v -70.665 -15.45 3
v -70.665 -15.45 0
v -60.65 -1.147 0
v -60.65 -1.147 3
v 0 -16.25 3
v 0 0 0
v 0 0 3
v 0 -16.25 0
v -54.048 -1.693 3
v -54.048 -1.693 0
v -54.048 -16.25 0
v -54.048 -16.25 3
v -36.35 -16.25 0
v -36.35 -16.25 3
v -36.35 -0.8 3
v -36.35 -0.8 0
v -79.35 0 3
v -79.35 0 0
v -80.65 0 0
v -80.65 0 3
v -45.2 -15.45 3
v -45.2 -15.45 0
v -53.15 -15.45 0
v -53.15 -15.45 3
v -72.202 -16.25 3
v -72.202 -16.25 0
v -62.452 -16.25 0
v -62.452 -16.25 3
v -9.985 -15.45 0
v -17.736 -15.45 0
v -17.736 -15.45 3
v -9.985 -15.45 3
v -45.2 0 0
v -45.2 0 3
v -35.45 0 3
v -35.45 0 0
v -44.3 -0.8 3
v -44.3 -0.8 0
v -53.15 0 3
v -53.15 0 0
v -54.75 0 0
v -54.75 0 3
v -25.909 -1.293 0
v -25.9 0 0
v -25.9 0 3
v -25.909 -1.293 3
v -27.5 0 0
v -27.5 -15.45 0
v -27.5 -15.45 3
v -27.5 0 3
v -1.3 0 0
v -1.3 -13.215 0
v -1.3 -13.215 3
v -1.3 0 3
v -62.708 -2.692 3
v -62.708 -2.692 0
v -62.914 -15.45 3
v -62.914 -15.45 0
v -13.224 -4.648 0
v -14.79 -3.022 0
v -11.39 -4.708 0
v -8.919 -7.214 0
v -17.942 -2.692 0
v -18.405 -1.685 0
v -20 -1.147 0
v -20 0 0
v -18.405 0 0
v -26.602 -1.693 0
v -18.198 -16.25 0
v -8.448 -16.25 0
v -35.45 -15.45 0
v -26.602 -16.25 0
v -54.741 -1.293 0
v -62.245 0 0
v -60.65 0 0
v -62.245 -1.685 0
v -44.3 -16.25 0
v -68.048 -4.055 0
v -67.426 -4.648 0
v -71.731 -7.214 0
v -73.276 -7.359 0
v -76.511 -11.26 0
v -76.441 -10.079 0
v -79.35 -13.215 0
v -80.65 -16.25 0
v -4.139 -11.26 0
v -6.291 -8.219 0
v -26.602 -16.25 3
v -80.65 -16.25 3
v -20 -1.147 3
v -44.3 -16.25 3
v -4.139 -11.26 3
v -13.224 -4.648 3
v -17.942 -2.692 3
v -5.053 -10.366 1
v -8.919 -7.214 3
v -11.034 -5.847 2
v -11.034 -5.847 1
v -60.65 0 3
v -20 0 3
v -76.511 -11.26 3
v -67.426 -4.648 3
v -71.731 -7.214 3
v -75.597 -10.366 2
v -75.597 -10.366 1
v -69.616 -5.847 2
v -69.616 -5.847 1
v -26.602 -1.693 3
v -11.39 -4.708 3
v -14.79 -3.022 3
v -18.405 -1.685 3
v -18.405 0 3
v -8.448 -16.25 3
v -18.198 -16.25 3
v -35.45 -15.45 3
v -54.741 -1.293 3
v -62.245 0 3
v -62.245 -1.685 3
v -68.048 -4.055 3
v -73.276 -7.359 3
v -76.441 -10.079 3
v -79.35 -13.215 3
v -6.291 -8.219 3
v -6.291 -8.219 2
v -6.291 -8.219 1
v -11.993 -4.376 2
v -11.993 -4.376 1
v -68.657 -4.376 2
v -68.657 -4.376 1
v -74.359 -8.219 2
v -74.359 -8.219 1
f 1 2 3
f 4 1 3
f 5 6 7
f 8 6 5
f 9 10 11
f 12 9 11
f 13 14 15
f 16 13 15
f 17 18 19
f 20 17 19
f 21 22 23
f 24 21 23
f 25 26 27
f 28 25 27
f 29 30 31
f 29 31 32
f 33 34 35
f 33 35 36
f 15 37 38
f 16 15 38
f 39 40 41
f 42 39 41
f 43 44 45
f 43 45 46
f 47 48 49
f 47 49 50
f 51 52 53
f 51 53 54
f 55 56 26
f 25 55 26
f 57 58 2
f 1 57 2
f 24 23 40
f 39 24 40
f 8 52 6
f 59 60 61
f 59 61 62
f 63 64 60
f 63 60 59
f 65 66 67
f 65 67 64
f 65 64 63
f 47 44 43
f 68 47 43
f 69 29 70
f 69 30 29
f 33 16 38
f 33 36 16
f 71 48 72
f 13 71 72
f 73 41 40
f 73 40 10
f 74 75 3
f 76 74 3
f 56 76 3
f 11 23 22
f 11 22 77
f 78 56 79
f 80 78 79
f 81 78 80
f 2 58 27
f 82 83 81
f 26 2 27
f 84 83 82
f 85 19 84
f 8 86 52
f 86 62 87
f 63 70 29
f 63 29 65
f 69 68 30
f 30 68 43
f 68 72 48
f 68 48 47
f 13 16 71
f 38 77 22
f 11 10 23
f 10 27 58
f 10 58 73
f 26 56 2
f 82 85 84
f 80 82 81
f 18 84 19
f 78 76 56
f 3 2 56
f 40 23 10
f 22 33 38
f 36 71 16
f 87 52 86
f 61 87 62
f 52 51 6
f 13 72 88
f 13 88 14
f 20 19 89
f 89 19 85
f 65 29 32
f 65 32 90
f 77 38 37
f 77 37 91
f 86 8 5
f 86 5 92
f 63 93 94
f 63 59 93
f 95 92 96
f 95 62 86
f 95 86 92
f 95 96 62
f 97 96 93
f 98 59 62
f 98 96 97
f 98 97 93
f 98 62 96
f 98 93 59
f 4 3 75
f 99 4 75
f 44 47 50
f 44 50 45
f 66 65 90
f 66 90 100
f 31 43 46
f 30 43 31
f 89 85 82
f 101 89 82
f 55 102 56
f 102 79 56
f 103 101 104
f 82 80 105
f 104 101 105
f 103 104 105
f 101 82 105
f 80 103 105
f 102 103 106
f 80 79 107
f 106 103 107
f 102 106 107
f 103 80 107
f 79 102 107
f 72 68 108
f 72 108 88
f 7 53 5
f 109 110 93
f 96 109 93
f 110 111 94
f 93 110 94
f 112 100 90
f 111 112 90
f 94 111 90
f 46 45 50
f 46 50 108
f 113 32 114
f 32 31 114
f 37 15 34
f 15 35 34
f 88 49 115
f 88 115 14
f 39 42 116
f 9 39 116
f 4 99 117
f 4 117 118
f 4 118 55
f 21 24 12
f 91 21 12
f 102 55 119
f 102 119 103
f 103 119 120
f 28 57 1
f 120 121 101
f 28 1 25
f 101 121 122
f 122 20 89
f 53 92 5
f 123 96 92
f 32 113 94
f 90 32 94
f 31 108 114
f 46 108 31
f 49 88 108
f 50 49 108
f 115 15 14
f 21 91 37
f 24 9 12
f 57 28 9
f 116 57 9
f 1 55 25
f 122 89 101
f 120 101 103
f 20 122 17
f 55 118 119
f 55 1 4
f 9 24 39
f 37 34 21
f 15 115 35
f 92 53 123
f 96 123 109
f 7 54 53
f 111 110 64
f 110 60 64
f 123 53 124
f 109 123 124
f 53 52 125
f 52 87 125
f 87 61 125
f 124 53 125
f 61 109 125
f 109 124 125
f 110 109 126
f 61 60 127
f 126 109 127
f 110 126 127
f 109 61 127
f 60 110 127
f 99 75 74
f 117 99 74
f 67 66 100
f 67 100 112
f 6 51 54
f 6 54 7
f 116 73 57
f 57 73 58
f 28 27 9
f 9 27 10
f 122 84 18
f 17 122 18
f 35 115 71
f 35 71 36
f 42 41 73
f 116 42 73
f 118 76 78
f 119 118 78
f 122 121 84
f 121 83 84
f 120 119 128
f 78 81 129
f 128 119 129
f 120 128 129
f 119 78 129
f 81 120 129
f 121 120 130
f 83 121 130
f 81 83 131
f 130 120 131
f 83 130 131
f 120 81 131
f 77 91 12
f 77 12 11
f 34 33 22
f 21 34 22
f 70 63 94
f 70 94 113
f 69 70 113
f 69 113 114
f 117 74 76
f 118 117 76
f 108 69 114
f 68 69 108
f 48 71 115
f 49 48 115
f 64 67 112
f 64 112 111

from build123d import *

# Parameters (mm, degrees)
BOSS_EXTRUDE1_DEPTH    = 3
SKETCH2_W              = 0.9
SKETCH2_H              = 15.45
BOSS_EXTRUDE2_DEPTH    = 3
SPLIT1_DEPTH           = 3
SPLIT1_START           = -36.35
SPLIT1_2_OUTLINE_W     = 16.25
SPLIT1_2_OUTLINE_H     = 3
SPLIT1_2_DEPTH         = 0.9
SPLIT1_START_2         = -35.45
SPLIT1_3_OUTLINE_W     = 0.8
SPLIT1_3_OUTLINE_H     = 3
SPLIT1_3_DEPTH         = 7.95
SPLIT1_4_DEPTH         = 3
BODY_MOVE_COPY13_ANGLE = 180
BODY_MOVE_COPY17_ANGLE = 180


# Read off the part's stored shape, not the designer's step: Split1
with BuildPart() as part:
    # Sketch1 → Boss-Extrude1 (new body)
    with BuildSketch(Plane(origin=(0, 0, 0), x_dir=(0, 1, 0), z_dir=(0, 0, 1))):
        with BuildLine():
            Line((0, 0), (-16.25, 0))
            add(Edge.make_bspline(
                [(-16.25, 0), (-9.683887405, 4.589558491), (-5.164437434, 10.570069252), (-2.691650088, 17.941532282)],
                knots=[0, 0, 0, 0, 0.866320649, 0.866320649, 0.866320649, 0.866320649], degree=3))
            Line((-2.691650088, 17.941532282), (-16.25, 8.447873633))
            Line((-16.25, 8.447873633), (-16.25, 18.197873462))
            Line((-16.25, 18.197873462), (-1.693141934, 26.602279385))
            Line((-1.693141934, 26.602279385), (-16.25, 26.602279385))
            Line((-16.25, 26.602279385), (-16.25, 45.197720615))
            Line((-16.25, 45.197720615), (-1.693141934, 45.197720615))
            Line((-1.693141934, 45.197720615), (-16.25, 53.602126538))
            Line((-16.25, 53.602126538), (-16.25, 63.352126367))
            Line((-16.25, 63.352126367), (-2.691650088, 53.858467718))
            add(Edge.make_bspline(
                [(-16.25, 71.8), (-9.683887405, 67.210441509), (-5.164437434, 61.229930748), (-2.691650088, 53.858467718)],
                knots=[0, 0, 0, 0, 0.866320649, 0.866320649, 0.866320649, 0.866320649], degree=3))
            Line((-16.25, 71.8), (0, 71.8))
            Line((0, 71.8), (0, 70.499844847))
            Line((0, 70.499844847), (-13.214812034, 70.499844847))
            add(Edge.make_bspline(
                [(-13.214812034, 70.499844847), (-7.643374044, 65.864497023), (-3.799959359, 60.162821742), (-1.68456798, 53.394819004)],
                knots=[0, 0, 0, 0, 0.803721546, 0.803721546, 0.803721546, 0.803721546], degree=3))
            Line((-1.68456798, 53.394819004), (0, 53.394819004))
            Line((0, 53.394819004), (0, 51.800000008))
            Line((0, 51.800000008), (-1.146610933, 51.800000008))
            Line((-1.146610933, 51.800000008), (-15.450000067, 61.815340728))
            Line((-15.450000067, 61.815340728), (-15.450000067, 54.064006792))
            Line((-15.450000067, 54.064006792), (-1.293141934, 45.890540938))
            Line((-1.293141934, 45.890540938), (0, 45.9))
            Line((0, 45.9), (0, 44.3))
            Line((0, 44.3), (-15.45, 44.3))
            Line((-15.45, 44.3), (-15.45, 27.5))
            Line((-15.45, 27.5), (0, 27.5))
            Line((0, 27.5), (0, 25.9))
            Line((0, 25.9), (-1.293141934, 25.909459062))
            Line((-1.293141934, 25.909459062), (-15.450000067, 17.735993208))
            Line((-15.450000067, 17.735993208), (-15.450000067, 9.984659272))
            Line((-15.450000067, 9.984659272), (-1.146610933, 19.999999992))
            Line((-1.146610933, 19.999999992), (0, 19.999999992))
            Line((0, 19.999999992), (0, 18.405180996))
            Line((0, 18.405180996), (-1.68456798, 18.405180996))
            add(Edge.make_bspline(
                [(-13.214812034, 1.300155153), (-7.643374044, 5.935502977), (-3.799959359, 11.637178258), (-1.68456798, 18.405180996)],
                knots=[0, 0, 0, 0, 0.803721546, 0.803721546, 0.803721546, 0.803721546], degree=3))
            Line((-13.214812034, 1.300155153), (0, 1.300155153))
            Line((0, 1.300155153), (0, 0))
        make_face()
    extrude(amount=BOSS_EXTRUDE1_DEPTH)

    # Sketch2 → Boss-Extrude2 (add)
    with BuildSketch(Plane.XY.offset(3)):
        with Locations((-35.9, -7.725)):
            Rectangle(SKETCH2_W, SKETCH2_H)
    extrude(amount=-BOSS_EXTRUDE2_DEPTH)

    # Split1 outline → Split1 (cut)
    with BuildSketch(Plane.XY):
        with BuildLine():
            Line((-53.394819004, 0), (-53.394819004, -1.68456798))
            add(Edge.make_bspline(
                [(-53.394819004, -1.68456798), (-60.162821742, -3.799959359), (-65.864497023, -7.643374044), (-70.499844847, -13.214812034)],
                knots=[0, 0, 0, 0, 0.803721546, 0.803721546, 0.803721546, 0.803721546], degree=3))
            Line((-70.499844847, -13.214812034), (-70.499844847, 0))
            Line((-70.499844847, 0), (-71.8, 0))
            Line((-71.8, 0), (-71.8, -16.25))
            add(Edge.make_bspline(
                [(-71.8, -16.25), (-67.210441509, -9.683887405), (-61.229930748, -5.164437434), (-53.858467718, -2.691650088)],
                knots=[0, 0, 0, 0, 0.866320649, 0.866320649, 0.866320649, 0.866320649], degree=3))
            Line((-53.858467718, -2.691650088), (-63.352126367, -16.25))
            Line((-63.352126367, -16.25), (-53.602126538, -16.25))
            Line((-53.602126538, -16.25), (-45.197720615, -1.693141934))
            Line((-45.197720615, -1.693141934), (-45.197720615, -16.25))
            Line((-45.197720615, -16.25), (-27.5, -16.25))
            Line((-27.5, -16.25), (-27.5, -15.45))
            Line((-27.5, -15.45), (-35.45, -15.45))
            Line((-35.45, -15.45), (-35.45, 0))
            Line((-35.45, 0), (-36.35, 0))
            Line((-36.35, 0), (-36.35, -15.45))
            Line((-36.35, -15.45), (-44.3, -15.45))
            Line((-44.3, -15.45), (-44.3, 0))
            Line((-44.3, 0), (-45.9, 0))
            Line((-45.9, 0), (-45.890540938, -1.293141934))
            Line((-45.890540938, -1.293141934), (-54.064006792, -15.450000067))
            Line((-54.064006792, -15.450000067), (-61.815340728, -15.450000067))
            Line((-61.815340728, -15.450000067), (-51.800000008, -1.146610933))
            Line((-51.800000008, -1.146610933), (-51.800000008, 0))
            Line((-51.800000008, 0), (-53.394819004, 0))
        make_face()
    extrude(amount=SPLIT1_DEPTH, mode=Mode.SUBTRACT)


with BuildPart() as body_2:
    # Split1 2 outline → Split1 2 (new body)
    with BuildSketch(Plane.YZ.offset(SPLIT1_START)):
        with Locations((-8.125, 1.5)):
            Rectangle(SPLIT1_2_OUTLINE_W, SPLIT1_2_OUTLINE_H)
    extrude(amount=SPLIT1_2_DEPTH)

    # Split1 3 outline → Split1 3 (add)
    with BuildSketch(Plane.YZ.offset(SPLIT1_START_2)):
        with Locations((-15.85, 1.5)):
            Rectangle(SPLIT1_3_OUTLINE_W, SPLIT1_3_OUTLINE_H)
    extrude(amount=SPLIT1_3_DEPTH)


with BuildPart() as body_3:
    # Split1 4 outline → Split1 4 (new body)
    with BuildSketch(Plane.XY):
        with BuildLine():
            Line((-36.35, -16.25), (-36.35, -15.45))
            Line((-36.35, -15.45), (-44.3, -15.45))
            Line((-44.3, -15.45), (-44.3, 0))
            Line((-44.3, 0), (-45.9, 0))
            Line((-45.9, 0), (-45.890540938, -1.293141934))
            Line((-45.890540938, -1.293141934), (-54.064006792, -15.450000067))
            Line((-54.064006792, -15.450000067), (-61.815340728, -15.450000067))
            Line((-61.815340728, -15.450000067), (-51.800000008, -1.146610933))
            Line((-51.800000008, -1.146610933), (-51.800000008, 0))
            Line((-51.800000008, 0), (-53.394819004, 0))
            Line((-53.394819004, 0), (-53.394819004, -1.68456798))
            add(Edge.make_bspline(
                [(-53.394819004, -1.68456798), (-60.162821742, -3.799959359), (-65.864497023, -7.643374044), (-70.499844847, -13.214812034)],
                knots=[0, 0, 0, 0, 0.803721546, 0.803721546, 0.803721546, 0.803721546], degree=3))
            Line((-70.499844847, -13.214812034), (-70.499844847, 0))
            Line((-70.499844847, 0), (-71.8, 0))
            Line((-71.8, 0), (-71.8, -16.25))
            add(Edge.make_bspline(
                [(-71.8, -16.25), (-67.210441509, -9.683887405), (-61.229930748, -5.164437434), (-53.858467718, -2.691650088)],
                knots=[0, 0, 0, 0, 0.866320649, 0.866320649, 0.866320649, 0.866320649], degree=3))
            Line((-53.858467718, -2.691650088), (-63.352126367, -16.25))
            Line((-63.352126367, -16.25), (-53.602126538, -16.25))
            Line((-53.602126538, -16.25), (-45.197720615, -1.693141934))
            Line((-45.197720615, -1.693141934), (-45.197720615, -16.25))
            Line((-45.197720615, -16.25), (-36.35, -16.25))
        make_face()
    extrude(amount=SPLIT1_4_DEPTH)


with BuildPart() as body_3_1:
    # Body-Move/Copy11: moved
    add(body_3.part.moved(Location((-8.85, 0, 0))))


with BuildPart() as body_2_1:
    # Body-Move/Copy12: moved
    add(body_2.part.moved(Location((-8.85, 0, 0))))


with BuildPart() as body_2_2:
    # Body-Move/Copy13: moved
    add(body_2_1.part.rotate(Axis((0, -8.125, 1.5), (1, 0, 0)), BODY_MOVE_COPY13_ANGLE))


with BuildPart() as body_4:
    # Body-Move/Copy14: copy of body 2
    add(body_2_2.part.moved(Location((8.85, 0, 0))))


with BuildPart() as body_4_1:
    # Body-Move/Copy17: moved
    add(body_4.part.rotate(Axis((0, -8.125, 1.5), (1, 0, 0)), BODY_MOVE_COPY17_ANGLE))


with BuildPart() as body_3_2:
    add(body_3_1.part)

    # Combine1: union body 4, body 2, part
    add(body_4_1.part)
    add(body_2_2.part)
    add(part.part)


solid = body_3_2.part
